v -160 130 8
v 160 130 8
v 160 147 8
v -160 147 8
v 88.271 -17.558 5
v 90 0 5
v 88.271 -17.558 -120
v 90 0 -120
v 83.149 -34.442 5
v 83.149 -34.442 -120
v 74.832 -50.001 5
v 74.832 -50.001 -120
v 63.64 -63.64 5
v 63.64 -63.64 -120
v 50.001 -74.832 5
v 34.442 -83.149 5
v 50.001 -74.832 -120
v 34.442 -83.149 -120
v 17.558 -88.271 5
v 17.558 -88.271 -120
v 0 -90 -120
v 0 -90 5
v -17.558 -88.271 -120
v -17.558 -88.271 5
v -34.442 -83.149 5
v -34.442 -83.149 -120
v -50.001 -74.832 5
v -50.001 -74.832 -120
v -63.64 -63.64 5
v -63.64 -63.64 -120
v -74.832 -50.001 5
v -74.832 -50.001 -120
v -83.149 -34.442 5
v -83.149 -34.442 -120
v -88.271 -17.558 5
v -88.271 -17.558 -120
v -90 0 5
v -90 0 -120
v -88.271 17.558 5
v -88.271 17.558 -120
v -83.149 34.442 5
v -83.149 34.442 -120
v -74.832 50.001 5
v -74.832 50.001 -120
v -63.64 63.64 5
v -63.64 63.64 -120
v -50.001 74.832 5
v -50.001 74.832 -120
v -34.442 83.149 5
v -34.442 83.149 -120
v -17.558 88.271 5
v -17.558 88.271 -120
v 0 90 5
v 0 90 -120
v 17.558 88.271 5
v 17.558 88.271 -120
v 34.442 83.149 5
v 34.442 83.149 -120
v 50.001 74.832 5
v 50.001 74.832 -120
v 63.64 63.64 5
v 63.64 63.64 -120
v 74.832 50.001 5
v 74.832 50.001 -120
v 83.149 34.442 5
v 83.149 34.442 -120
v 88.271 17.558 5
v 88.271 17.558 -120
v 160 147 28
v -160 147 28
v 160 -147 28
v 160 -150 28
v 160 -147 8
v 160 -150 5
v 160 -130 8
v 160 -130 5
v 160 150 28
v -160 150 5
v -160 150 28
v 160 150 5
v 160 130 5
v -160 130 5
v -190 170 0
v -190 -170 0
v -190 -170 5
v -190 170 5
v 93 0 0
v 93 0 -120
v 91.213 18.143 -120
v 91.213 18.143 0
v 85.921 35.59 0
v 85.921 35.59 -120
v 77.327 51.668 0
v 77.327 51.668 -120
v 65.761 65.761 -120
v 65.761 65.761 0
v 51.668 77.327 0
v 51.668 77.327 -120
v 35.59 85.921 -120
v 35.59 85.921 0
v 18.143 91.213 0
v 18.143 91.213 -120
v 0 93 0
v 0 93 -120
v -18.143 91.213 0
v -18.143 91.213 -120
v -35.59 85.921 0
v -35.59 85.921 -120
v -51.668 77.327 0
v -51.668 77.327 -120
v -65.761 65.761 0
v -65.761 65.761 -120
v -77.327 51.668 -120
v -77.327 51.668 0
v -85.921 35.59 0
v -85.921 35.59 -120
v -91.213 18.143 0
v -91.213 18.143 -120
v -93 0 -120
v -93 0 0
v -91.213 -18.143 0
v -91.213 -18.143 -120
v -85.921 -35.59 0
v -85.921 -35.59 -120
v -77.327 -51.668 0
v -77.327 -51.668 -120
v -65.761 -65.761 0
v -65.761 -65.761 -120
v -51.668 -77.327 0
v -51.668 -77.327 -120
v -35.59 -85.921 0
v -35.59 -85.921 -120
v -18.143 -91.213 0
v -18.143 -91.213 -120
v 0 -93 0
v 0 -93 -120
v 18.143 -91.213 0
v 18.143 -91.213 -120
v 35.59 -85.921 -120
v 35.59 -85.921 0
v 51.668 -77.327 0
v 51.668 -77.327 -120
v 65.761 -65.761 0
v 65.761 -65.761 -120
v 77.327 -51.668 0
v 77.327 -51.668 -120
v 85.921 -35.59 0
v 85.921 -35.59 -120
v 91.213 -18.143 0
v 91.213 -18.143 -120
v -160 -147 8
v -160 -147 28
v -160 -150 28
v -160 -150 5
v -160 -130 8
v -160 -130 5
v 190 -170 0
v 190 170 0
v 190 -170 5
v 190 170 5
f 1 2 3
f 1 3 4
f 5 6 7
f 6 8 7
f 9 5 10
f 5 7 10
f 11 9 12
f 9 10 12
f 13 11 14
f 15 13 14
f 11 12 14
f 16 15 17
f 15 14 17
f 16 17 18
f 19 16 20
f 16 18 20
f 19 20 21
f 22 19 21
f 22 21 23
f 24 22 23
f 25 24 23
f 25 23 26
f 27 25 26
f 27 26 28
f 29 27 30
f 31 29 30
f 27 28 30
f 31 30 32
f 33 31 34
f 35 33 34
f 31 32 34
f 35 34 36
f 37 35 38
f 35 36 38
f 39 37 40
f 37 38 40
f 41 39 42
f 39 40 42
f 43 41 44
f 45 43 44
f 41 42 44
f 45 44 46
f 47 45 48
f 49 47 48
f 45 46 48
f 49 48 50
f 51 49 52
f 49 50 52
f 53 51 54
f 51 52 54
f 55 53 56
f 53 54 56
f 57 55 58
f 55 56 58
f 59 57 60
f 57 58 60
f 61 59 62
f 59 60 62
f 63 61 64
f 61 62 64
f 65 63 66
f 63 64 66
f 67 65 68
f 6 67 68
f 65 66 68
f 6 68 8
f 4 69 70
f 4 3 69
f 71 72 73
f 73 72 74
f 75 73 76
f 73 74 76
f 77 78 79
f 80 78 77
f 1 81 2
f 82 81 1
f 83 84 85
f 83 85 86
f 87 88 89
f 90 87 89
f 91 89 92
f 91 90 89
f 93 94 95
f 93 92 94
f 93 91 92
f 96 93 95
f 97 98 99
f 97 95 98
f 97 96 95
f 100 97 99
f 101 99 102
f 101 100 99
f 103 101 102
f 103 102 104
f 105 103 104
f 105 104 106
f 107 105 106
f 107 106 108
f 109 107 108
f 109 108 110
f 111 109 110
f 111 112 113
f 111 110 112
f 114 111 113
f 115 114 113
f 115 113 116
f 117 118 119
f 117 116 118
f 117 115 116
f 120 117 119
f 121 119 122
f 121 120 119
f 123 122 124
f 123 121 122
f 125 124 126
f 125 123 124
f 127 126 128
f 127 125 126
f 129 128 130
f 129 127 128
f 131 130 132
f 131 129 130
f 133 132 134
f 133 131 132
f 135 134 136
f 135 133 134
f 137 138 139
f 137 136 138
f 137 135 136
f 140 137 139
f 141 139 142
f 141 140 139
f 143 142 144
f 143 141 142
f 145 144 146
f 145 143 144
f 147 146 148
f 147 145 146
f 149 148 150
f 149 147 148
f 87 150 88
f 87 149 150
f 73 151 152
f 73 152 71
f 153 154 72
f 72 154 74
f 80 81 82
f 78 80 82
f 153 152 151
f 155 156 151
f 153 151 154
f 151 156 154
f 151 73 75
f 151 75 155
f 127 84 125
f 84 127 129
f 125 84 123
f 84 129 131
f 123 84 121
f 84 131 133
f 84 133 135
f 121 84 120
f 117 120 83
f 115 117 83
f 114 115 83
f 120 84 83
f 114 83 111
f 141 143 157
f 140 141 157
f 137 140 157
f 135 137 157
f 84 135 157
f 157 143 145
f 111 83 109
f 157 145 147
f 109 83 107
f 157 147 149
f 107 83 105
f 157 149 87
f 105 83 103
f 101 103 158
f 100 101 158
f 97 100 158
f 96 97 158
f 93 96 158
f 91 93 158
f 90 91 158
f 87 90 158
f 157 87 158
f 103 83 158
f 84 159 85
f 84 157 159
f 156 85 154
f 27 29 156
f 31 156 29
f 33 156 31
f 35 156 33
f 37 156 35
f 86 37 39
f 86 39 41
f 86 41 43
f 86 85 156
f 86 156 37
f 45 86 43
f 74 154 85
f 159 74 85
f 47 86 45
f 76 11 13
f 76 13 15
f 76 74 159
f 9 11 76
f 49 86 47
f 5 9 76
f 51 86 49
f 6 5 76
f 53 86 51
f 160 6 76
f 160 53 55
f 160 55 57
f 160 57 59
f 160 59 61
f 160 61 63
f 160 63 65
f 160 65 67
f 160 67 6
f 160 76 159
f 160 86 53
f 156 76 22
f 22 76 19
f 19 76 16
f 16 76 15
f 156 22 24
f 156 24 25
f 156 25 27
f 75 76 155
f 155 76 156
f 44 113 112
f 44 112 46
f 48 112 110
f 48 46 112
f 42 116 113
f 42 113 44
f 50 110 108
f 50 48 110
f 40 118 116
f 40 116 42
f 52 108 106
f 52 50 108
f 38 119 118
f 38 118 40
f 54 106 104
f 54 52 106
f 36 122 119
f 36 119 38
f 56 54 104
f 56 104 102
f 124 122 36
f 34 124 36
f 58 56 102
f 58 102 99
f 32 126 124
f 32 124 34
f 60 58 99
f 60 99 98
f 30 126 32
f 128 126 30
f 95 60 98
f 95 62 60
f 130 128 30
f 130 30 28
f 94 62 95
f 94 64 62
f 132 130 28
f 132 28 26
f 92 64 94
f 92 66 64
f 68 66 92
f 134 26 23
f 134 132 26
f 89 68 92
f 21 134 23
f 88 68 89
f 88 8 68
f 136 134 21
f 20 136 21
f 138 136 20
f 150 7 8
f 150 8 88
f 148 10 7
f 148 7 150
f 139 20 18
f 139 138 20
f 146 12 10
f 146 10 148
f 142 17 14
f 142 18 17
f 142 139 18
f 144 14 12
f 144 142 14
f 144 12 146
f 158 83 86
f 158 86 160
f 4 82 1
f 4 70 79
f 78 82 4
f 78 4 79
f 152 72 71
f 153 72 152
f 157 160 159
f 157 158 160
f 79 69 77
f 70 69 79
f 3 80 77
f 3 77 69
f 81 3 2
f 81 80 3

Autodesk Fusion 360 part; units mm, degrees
sketch "Esquisse1" plane through (0, 0, 0) normal (0, 0, 1) x (1, 0, 0)
  line L0 (190, -170) -> (-190, -170)
  line L1 (-190, -170) -> (-190, 170)
  line L2 (-190, 170) -> (190, 170)
  line L3 (190, 170) -> (190, -170)
  line L4 (190, -170) -> (-190, 170) construction
  line L5 (-190, -170) -> (190, 170) construction
  dimension "d1" = 380
  dimension "d2" = 340
extrude "Extrusion1" add sketch "Esquisse1" along normal blind 5 makes body 1
sketch "Esquisse2" plane through (0, 0, 0) normal (0, 0, -1) x (1, 0, 0)
  line L0 (-190, -170) -> (190, -170)
  line L1 (190, -170) -> (190, 170)
  line L2 (190, 170) -> (-190, 170)
  line L3 (-190, 170) -> (-190, -170)
  circle A0 centre (0, 0) radius 93
  dimension "d5" = 186
extrude "Extrusion2" add sketch "Esquisse2" along normal blind 120 contours A0 bodies 1
sketch "Esquisse3" plane through (0, 0, -120) normal (0, 0, -1) x (1, 0, 0)
  circle A0 centre (0, 0) radius 93
  circle A1 centre (0, 0) radius 90
  dimension "d8" = 180
extrude "Extrusion3" cut sketch "Esquisse3" against normal blind 125 contours A1 bodies 1
sketch "Esquisse4" plane through (0, 0, 5) normal (0, 0, 1) x (-1, 0, 0)
  circle A0 centre (0, 0) radius 90
  line L0 (-190, -170) -> (190, -170)
  line L1 (190, -170) -> (190, 170)
  line L2 (190, 170) -> (-190, 170)
  line L3 (-190, 170) -> (-190, -170)
  line L4 (160.0001, -149.9995) -> (-159.9999, -149.9995)
  line L5 (-159.9999, -149.9995) -> (-159.9999, -129.9995)
  line L6 (-159.9999, -129.9995) -> (160.0001, -129.9995)
  line L7 (160.0001, -129.9995) -> (160.0001, -149.9995)
  dimension "d11" = 320
  dimension "d12" = 20
extrude "Extrusion4" add sketch "Esquisse4" along normal blind 3 separate body contours L4 L5 L6 L7 makes body 2
sketch "Esquisse11" plane through (0, 0, 8) normal (0, 0, 1) x (-1, 0, 0)
  line L0 (160.0001, -129.9995) -> (-159.9999, -129.9995)
  line L1 (-159.9999, -129.9995) -> (-159.9999, -149.9995)
  line L2 (-159.9999, -149.9995) -> (160.0001, -149.9995)
  line L3 (160.0001, -149.9995) -> (160.0001, -129.9995)
  line L4 (160.0001, -149.9995) -> (-159.9999, -149.9995)
  line L5 (-159.9999, -149.9995) -> (-159.9999, -146.9995)
  line L6 (-159.9999, -146.9995) -> (160.0001, -146.9995)
  line L7 (160.0001, -146.9995) -> (160.0001, -149.9995)
  dimension "d16" = 320
  dimension "d17" = 3
extrude "Extrusion5" add sketch "Esquisse11" along normal blind 20 contours L1 L2 L3 L4 L5 L6 L7 bodies 2
sketch "Esquisse12" plane through (0, 0, 5) normal (0, 0, 1) x (-1, 0, 0)
  circle A0 centre (0, 0) radius 90
  line L0 (-190, -170) -> (190, -170)
  line L1 (190, -170) -> (190, 170)
  line L2 (190, 170) -> (-190, 170)
  line L3 (-190, 170) -> (-190, -170)
  line L4 (-159.9999, 129.9997) -> (160.0001, 129.9997)
  line L5 (160.0001, 129.9997) -> (160.0001, 149.9997)
  line L6 (160.0001, 149.9997) -> (-159.9999, 149.9997)
  line L7 (-159.9999, 149.9997) -> (-159.9999, 129.9997)
  dimension "d20" = 320
  dimension "d21" = 20
extrude "Extrusion6" add sketch "Esquisse12" along normal blind 3 contours L4 L5 L6 L7 bodies 1
sketch "Esquisse13" plane through (0, 0, 8) normal (0, 0, 1) x (-1, 0, 0)
  line L0 (-159.9999, 149.9997) -> (-159.9999, 129.9997)
  line L1 (-159.9999, 129.9997) -> (160.0001, 129.9997)
  line L2 (160.0001, 129.9997) -> (160.0001, 149.9997)
  line L3 (160.0001, 149.9997) -> (-159.9999, 149.9997)
  line L4 (-159.9999, 149.9997) -> (160.0001, 149.9997)
  line L5 (160.0001, 149.9997) -> (160.0001, 146.9997)
  line L6 (160.0001, 146.9997) -> (-159.9999, 146.9997)
  line L7 (-159.9999, 146.9997) -> (-159.9999, 149.9997)
  dimension "d24" = 320
  dimension "d25" = 3
extrude "Extrusion7" add sketch "Esquisse13" along normal blind 20 contours L0 L2 L3 L4 L5 L6 L7 bodies 1
